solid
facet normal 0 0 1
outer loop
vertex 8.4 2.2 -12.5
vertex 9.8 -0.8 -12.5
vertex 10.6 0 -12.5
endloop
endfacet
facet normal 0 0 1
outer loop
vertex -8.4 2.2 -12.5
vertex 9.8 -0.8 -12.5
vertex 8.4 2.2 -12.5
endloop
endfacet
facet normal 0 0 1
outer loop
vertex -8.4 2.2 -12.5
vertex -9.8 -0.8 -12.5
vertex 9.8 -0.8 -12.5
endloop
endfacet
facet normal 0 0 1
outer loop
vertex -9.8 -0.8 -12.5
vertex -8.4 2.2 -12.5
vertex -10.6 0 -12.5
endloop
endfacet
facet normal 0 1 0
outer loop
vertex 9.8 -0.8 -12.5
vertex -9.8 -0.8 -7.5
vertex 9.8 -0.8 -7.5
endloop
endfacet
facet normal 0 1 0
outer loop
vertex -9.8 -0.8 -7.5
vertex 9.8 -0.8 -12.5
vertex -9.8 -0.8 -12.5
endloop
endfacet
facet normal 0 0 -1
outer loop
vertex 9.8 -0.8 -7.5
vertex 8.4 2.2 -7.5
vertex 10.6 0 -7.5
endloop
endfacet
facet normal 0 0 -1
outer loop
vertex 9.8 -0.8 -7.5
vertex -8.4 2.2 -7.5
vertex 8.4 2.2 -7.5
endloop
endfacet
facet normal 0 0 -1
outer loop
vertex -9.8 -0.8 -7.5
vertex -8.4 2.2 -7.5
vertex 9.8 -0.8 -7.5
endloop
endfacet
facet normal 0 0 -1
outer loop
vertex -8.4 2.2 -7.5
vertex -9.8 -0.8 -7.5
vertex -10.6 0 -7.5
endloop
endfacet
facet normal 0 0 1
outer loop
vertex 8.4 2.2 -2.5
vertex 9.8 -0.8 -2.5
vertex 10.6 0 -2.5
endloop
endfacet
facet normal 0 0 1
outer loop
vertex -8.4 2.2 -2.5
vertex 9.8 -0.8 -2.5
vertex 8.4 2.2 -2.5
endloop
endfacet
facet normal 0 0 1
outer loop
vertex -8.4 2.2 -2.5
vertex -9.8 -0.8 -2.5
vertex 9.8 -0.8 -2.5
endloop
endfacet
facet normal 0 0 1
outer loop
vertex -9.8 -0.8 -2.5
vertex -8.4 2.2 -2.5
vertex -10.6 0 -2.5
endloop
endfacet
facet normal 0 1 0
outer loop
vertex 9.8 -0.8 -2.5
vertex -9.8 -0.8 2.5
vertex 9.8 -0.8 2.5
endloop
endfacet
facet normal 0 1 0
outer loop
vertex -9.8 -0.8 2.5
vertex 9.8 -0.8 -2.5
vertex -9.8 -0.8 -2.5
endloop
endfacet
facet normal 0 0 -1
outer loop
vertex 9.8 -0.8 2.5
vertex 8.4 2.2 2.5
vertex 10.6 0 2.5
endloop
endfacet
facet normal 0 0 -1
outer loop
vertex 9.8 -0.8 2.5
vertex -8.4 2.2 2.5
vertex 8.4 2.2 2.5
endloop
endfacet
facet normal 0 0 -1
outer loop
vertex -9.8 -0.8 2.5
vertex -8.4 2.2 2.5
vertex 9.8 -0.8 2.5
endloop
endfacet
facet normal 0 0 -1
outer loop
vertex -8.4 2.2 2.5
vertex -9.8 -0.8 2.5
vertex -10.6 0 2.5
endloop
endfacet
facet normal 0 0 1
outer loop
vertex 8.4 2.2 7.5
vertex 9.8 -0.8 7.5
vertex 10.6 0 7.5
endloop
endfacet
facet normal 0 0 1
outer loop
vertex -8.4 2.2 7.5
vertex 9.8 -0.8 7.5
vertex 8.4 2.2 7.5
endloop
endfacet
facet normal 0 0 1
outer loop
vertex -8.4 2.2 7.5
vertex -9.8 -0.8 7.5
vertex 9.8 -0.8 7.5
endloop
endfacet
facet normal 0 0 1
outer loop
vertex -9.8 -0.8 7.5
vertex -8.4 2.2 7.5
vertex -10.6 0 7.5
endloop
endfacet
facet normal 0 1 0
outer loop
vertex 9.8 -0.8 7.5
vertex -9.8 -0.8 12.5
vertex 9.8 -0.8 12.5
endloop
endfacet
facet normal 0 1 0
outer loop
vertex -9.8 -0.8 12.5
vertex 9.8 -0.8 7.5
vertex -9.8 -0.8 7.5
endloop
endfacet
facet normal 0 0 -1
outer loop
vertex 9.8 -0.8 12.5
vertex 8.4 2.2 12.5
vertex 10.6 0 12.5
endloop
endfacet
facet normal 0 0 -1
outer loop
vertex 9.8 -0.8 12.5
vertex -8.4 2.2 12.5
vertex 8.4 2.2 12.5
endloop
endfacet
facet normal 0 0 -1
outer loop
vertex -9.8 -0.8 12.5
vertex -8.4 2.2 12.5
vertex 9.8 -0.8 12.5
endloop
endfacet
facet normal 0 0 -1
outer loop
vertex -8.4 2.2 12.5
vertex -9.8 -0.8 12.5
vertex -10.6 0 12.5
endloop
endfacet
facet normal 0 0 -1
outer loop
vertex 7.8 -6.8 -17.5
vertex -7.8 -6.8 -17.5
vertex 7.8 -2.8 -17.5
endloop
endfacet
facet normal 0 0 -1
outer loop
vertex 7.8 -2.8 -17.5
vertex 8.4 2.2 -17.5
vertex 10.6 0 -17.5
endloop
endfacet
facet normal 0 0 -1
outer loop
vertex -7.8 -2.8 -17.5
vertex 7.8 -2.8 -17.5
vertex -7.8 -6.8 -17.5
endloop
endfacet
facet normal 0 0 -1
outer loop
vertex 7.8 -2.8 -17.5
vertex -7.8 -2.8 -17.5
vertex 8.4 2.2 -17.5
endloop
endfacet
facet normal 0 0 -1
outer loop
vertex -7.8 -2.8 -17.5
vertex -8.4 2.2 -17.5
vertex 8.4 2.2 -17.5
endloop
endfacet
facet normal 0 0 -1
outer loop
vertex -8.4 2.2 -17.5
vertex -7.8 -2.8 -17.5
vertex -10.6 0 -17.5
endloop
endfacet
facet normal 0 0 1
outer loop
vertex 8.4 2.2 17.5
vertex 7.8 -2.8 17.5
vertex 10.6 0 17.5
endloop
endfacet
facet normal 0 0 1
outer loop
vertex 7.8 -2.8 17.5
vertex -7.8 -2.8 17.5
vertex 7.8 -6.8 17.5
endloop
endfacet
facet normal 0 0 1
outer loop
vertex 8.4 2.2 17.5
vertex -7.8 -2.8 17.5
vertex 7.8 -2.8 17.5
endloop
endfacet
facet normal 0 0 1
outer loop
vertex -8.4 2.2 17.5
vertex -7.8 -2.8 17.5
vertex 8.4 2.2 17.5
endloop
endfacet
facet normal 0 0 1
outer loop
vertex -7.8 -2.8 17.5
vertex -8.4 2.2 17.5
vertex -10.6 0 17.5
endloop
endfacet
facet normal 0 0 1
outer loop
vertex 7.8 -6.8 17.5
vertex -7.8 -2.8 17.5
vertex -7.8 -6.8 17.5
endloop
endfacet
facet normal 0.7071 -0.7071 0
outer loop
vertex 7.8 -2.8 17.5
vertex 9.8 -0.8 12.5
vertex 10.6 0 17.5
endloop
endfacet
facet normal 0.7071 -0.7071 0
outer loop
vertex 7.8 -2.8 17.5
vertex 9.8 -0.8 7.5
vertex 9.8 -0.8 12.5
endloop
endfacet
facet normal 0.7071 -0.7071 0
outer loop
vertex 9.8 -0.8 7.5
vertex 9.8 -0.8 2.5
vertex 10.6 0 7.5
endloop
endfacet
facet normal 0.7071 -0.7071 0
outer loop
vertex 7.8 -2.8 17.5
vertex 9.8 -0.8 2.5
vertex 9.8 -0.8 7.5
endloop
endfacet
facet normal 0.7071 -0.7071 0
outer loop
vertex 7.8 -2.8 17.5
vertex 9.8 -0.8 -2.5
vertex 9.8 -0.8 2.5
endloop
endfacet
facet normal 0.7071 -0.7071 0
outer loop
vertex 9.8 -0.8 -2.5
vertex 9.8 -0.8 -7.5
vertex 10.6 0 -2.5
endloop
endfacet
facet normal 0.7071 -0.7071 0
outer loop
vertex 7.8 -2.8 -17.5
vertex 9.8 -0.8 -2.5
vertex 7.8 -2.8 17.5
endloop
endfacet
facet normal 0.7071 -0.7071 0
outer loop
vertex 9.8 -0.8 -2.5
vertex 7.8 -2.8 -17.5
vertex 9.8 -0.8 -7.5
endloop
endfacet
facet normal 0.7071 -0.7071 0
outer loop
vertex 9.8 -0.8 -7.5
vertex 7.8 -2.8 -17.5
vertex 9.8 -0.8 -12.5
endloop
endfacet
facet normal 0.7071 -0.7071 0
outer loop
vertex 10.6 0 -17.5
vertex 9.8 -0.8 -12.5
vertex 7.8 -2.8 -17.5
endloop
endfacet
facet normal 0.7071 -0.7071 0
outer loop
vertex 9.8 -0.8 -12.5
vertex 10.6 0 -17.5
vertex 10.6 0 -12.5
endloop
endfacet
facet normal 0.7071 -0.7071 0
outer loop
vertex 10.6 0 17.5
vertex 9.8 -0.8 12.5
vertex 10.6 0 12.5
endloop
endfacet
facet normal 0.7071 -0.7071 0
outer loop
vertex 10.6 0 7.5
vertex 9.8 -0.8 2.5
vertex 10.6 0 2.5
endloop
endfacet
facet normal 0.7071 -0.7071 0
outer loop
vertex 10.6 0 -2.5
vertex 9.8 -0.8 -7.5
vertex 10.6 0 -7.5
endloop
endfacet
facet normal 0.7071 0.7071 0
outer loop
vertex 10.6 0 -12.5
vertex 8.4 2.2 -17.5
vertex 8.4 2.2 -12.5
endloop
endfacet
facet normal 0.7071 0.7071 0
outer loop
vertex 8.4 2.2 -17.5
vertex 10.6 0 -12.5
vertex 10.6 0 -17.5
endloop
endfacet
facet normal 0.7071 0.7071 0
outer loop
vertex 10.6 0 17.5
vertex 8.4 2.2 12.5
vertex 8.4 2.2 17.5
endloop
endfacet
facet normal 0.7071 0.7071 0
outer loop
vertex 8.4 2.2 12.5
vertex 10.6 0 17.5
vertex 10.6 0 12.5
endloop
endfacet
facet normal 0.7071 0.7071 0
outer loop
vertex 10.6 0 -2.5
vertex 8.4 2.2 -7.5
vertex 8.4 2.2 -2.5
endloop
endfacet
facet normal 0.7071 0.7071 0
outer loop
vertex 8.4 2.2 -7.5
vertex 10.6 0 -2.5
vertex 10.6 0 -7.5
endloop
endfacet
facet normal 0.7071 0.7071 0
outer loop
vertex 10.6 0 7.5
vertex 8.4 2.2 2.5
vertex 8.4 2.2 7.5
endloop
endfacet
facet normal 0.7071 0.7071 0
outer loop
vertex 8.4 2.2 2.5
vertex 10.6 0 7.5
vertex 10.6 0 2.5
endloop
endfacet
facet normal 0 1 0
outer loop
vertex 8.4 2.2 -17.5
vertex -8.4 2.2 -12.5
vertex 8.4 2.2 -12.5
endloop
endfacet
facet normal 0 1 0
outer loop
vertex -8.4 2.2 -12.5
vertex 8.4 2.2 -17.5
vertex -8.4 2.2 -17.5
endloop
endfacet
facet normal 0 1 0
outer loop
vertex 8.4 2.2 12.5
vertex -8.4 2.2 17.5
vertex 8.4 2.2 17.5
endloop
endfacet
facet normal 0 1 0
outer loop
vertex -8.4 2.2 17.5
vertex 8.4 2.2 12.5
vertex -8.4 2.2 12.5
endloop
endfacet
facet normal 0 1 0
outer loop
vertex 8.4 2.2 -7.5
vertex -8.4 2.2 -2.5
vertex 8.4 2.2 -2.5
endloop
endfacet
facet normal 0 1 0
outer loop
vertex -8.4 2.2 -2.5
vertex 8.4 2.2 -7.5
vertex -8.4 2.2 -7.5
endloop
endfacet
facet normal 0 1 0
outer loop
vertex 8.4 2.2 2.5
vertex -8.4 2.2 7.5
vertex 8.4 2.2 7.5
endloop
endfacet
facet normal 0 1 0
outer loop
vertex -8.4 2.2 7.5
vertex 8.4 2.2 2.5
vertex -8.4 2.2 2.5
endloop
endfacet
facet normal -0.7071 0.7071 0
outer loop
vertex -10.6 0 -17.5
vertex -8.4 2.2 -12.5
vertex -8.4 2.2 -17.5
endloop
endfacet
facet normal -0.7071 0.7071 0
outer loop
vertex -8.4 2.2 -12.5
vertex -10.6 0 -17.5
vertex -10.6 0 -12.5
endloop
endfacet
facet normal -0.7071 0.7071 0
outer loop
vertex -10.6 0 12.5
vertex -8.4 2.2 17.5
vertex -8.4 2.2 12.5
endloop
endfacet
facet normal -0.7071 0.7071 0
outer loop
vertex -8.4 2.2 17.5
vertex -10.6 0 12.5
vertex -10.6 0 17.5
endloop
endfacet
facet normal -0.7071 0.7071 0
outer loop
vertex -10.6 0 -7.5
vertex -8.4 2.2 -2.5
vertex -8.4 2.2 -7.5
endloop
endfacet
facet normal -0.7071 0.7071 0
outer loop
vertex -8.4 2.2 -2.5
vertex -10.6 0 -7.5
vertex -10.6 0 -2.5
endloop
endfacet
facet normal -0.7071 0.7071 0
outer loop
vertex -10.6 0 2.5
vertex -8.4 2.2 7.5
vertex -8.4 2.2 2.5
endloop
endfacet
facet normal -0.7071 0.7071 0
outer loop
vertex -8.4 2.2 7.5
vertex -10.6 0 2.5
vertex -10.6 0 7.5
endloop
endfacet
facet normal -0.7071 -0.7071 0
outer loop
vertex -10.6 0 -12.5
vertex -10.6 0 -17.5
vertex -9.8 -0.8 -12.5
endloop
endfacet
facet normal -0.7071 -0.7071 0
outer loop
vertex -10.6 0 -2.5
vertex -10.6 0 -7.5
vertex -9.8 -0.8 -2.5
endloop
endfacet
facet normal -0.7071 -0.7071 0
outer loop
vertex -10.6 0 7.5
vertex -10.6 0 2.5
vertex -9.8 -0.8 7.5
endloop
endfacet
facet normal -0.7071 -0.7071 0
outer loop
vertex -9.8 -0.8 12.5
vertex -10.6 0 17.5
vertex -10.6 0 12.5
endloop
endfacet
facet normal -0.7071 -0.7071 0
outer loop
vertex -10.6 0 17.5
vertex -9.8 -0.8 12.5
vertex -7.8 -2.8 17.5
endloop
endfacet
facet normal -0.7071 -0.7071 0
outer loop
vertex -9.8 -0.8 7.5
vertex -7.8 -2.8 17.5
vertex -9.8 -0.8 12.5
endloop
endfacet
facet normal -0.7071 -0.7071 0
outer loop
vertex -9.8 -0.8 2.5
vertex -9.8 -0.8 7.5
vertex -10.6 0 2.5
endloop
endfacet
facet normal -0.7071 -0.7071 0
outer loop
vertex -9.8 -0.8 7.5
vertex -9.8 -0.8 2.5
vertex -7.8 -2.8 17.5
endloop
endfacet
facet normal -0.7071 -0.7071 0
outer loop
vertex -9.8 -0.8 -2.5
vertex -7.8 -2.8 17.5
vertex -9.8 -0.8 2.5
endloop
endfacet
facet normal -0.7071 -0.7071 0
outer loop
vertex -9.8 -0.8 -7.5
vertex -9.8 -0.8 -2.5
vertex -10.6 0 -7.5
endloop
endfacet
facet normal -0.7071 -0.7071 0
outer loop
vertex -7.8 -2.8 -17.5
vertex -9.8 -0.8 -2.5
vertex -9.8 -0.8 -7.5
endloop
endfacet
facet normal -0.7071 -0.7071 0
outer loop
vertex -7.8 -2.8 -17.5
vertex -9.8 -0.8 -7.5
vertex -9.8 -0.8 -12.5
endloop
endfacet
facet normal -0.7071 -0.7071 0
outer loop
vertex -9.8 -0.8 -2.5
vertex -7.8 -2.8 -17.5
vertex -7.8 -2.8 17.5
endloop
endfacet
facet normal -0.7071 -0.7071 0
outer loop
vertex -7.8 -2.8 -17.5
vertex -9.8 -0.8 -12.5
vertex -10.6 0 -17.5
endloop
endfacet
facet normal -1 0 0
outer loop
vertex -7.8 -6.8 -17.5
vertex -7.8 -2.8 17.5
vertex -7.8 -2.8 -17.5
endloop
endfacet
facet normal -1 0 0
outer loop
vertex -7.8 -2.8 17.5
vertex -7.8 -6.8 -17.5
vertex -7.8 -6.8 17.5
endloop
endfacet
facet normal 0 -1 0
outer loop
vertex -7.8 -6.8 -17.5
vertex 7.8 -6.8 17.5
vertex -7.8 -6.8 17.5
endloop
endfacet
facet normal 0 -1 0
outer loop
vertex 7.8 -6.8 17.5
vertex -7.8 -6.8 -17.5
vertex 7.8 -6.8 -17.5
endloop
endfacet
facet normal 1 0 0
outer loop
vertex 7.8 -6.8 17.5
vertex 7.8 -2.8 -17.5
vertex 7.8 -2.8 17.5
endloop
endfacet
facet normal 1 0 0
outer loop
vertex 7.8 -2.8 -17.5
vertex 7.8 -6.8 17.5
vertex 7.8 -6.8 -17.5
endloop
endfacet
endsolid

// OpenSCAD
/*
 Picatinny rail for G36 airsoft gun
 By Stuart Livings, Matthew Roberts. (C) 2010

 This work is free software; you can redistribute it and/or modify it under
 the terms of the GNU General Public License as published by the Free Software
 Foundation; version 2.

 This work is distributed in the hope that it will be useful, but WITHOUT ANY
 WARRANTY; without even the implied warranty of MERCHANTABILITY or FITNESS FOR
 A PARTICULAR PURPOSE. See the version 2 of the GNU General Public License for
 more details.
 */



rail(3);

module rail(sections) {
	translate(v = [0, 0, -5 * sections - 2.5]) difference() {
		linear_extrude(height = 5 + (10 * sections)) railprofile();
		union() {
			for (s = [1:sections]) {
				translate(v = [0, 0, 10 * s - 5]) linear_extrude(height = 5) cutprofile();
			}
		}
	}
}

module railprofile() {
	polygon(points=[[-10.6,0],[-8.4,2.2],[8.4,2.2],[10.6,0],[7.8,-2.8],[7.8,-6.8],[-7.8,-6.8],[-7.8,-2.8]], paths=[[0,1,2,3,4,5,6,7,0]]);
}

module cutprofile() {
	polygon(points=[[-12, -0.8], [-12, 3], [12, 3], [12, -0.8]], paths=[[0,1,2,3,0]]);
}
